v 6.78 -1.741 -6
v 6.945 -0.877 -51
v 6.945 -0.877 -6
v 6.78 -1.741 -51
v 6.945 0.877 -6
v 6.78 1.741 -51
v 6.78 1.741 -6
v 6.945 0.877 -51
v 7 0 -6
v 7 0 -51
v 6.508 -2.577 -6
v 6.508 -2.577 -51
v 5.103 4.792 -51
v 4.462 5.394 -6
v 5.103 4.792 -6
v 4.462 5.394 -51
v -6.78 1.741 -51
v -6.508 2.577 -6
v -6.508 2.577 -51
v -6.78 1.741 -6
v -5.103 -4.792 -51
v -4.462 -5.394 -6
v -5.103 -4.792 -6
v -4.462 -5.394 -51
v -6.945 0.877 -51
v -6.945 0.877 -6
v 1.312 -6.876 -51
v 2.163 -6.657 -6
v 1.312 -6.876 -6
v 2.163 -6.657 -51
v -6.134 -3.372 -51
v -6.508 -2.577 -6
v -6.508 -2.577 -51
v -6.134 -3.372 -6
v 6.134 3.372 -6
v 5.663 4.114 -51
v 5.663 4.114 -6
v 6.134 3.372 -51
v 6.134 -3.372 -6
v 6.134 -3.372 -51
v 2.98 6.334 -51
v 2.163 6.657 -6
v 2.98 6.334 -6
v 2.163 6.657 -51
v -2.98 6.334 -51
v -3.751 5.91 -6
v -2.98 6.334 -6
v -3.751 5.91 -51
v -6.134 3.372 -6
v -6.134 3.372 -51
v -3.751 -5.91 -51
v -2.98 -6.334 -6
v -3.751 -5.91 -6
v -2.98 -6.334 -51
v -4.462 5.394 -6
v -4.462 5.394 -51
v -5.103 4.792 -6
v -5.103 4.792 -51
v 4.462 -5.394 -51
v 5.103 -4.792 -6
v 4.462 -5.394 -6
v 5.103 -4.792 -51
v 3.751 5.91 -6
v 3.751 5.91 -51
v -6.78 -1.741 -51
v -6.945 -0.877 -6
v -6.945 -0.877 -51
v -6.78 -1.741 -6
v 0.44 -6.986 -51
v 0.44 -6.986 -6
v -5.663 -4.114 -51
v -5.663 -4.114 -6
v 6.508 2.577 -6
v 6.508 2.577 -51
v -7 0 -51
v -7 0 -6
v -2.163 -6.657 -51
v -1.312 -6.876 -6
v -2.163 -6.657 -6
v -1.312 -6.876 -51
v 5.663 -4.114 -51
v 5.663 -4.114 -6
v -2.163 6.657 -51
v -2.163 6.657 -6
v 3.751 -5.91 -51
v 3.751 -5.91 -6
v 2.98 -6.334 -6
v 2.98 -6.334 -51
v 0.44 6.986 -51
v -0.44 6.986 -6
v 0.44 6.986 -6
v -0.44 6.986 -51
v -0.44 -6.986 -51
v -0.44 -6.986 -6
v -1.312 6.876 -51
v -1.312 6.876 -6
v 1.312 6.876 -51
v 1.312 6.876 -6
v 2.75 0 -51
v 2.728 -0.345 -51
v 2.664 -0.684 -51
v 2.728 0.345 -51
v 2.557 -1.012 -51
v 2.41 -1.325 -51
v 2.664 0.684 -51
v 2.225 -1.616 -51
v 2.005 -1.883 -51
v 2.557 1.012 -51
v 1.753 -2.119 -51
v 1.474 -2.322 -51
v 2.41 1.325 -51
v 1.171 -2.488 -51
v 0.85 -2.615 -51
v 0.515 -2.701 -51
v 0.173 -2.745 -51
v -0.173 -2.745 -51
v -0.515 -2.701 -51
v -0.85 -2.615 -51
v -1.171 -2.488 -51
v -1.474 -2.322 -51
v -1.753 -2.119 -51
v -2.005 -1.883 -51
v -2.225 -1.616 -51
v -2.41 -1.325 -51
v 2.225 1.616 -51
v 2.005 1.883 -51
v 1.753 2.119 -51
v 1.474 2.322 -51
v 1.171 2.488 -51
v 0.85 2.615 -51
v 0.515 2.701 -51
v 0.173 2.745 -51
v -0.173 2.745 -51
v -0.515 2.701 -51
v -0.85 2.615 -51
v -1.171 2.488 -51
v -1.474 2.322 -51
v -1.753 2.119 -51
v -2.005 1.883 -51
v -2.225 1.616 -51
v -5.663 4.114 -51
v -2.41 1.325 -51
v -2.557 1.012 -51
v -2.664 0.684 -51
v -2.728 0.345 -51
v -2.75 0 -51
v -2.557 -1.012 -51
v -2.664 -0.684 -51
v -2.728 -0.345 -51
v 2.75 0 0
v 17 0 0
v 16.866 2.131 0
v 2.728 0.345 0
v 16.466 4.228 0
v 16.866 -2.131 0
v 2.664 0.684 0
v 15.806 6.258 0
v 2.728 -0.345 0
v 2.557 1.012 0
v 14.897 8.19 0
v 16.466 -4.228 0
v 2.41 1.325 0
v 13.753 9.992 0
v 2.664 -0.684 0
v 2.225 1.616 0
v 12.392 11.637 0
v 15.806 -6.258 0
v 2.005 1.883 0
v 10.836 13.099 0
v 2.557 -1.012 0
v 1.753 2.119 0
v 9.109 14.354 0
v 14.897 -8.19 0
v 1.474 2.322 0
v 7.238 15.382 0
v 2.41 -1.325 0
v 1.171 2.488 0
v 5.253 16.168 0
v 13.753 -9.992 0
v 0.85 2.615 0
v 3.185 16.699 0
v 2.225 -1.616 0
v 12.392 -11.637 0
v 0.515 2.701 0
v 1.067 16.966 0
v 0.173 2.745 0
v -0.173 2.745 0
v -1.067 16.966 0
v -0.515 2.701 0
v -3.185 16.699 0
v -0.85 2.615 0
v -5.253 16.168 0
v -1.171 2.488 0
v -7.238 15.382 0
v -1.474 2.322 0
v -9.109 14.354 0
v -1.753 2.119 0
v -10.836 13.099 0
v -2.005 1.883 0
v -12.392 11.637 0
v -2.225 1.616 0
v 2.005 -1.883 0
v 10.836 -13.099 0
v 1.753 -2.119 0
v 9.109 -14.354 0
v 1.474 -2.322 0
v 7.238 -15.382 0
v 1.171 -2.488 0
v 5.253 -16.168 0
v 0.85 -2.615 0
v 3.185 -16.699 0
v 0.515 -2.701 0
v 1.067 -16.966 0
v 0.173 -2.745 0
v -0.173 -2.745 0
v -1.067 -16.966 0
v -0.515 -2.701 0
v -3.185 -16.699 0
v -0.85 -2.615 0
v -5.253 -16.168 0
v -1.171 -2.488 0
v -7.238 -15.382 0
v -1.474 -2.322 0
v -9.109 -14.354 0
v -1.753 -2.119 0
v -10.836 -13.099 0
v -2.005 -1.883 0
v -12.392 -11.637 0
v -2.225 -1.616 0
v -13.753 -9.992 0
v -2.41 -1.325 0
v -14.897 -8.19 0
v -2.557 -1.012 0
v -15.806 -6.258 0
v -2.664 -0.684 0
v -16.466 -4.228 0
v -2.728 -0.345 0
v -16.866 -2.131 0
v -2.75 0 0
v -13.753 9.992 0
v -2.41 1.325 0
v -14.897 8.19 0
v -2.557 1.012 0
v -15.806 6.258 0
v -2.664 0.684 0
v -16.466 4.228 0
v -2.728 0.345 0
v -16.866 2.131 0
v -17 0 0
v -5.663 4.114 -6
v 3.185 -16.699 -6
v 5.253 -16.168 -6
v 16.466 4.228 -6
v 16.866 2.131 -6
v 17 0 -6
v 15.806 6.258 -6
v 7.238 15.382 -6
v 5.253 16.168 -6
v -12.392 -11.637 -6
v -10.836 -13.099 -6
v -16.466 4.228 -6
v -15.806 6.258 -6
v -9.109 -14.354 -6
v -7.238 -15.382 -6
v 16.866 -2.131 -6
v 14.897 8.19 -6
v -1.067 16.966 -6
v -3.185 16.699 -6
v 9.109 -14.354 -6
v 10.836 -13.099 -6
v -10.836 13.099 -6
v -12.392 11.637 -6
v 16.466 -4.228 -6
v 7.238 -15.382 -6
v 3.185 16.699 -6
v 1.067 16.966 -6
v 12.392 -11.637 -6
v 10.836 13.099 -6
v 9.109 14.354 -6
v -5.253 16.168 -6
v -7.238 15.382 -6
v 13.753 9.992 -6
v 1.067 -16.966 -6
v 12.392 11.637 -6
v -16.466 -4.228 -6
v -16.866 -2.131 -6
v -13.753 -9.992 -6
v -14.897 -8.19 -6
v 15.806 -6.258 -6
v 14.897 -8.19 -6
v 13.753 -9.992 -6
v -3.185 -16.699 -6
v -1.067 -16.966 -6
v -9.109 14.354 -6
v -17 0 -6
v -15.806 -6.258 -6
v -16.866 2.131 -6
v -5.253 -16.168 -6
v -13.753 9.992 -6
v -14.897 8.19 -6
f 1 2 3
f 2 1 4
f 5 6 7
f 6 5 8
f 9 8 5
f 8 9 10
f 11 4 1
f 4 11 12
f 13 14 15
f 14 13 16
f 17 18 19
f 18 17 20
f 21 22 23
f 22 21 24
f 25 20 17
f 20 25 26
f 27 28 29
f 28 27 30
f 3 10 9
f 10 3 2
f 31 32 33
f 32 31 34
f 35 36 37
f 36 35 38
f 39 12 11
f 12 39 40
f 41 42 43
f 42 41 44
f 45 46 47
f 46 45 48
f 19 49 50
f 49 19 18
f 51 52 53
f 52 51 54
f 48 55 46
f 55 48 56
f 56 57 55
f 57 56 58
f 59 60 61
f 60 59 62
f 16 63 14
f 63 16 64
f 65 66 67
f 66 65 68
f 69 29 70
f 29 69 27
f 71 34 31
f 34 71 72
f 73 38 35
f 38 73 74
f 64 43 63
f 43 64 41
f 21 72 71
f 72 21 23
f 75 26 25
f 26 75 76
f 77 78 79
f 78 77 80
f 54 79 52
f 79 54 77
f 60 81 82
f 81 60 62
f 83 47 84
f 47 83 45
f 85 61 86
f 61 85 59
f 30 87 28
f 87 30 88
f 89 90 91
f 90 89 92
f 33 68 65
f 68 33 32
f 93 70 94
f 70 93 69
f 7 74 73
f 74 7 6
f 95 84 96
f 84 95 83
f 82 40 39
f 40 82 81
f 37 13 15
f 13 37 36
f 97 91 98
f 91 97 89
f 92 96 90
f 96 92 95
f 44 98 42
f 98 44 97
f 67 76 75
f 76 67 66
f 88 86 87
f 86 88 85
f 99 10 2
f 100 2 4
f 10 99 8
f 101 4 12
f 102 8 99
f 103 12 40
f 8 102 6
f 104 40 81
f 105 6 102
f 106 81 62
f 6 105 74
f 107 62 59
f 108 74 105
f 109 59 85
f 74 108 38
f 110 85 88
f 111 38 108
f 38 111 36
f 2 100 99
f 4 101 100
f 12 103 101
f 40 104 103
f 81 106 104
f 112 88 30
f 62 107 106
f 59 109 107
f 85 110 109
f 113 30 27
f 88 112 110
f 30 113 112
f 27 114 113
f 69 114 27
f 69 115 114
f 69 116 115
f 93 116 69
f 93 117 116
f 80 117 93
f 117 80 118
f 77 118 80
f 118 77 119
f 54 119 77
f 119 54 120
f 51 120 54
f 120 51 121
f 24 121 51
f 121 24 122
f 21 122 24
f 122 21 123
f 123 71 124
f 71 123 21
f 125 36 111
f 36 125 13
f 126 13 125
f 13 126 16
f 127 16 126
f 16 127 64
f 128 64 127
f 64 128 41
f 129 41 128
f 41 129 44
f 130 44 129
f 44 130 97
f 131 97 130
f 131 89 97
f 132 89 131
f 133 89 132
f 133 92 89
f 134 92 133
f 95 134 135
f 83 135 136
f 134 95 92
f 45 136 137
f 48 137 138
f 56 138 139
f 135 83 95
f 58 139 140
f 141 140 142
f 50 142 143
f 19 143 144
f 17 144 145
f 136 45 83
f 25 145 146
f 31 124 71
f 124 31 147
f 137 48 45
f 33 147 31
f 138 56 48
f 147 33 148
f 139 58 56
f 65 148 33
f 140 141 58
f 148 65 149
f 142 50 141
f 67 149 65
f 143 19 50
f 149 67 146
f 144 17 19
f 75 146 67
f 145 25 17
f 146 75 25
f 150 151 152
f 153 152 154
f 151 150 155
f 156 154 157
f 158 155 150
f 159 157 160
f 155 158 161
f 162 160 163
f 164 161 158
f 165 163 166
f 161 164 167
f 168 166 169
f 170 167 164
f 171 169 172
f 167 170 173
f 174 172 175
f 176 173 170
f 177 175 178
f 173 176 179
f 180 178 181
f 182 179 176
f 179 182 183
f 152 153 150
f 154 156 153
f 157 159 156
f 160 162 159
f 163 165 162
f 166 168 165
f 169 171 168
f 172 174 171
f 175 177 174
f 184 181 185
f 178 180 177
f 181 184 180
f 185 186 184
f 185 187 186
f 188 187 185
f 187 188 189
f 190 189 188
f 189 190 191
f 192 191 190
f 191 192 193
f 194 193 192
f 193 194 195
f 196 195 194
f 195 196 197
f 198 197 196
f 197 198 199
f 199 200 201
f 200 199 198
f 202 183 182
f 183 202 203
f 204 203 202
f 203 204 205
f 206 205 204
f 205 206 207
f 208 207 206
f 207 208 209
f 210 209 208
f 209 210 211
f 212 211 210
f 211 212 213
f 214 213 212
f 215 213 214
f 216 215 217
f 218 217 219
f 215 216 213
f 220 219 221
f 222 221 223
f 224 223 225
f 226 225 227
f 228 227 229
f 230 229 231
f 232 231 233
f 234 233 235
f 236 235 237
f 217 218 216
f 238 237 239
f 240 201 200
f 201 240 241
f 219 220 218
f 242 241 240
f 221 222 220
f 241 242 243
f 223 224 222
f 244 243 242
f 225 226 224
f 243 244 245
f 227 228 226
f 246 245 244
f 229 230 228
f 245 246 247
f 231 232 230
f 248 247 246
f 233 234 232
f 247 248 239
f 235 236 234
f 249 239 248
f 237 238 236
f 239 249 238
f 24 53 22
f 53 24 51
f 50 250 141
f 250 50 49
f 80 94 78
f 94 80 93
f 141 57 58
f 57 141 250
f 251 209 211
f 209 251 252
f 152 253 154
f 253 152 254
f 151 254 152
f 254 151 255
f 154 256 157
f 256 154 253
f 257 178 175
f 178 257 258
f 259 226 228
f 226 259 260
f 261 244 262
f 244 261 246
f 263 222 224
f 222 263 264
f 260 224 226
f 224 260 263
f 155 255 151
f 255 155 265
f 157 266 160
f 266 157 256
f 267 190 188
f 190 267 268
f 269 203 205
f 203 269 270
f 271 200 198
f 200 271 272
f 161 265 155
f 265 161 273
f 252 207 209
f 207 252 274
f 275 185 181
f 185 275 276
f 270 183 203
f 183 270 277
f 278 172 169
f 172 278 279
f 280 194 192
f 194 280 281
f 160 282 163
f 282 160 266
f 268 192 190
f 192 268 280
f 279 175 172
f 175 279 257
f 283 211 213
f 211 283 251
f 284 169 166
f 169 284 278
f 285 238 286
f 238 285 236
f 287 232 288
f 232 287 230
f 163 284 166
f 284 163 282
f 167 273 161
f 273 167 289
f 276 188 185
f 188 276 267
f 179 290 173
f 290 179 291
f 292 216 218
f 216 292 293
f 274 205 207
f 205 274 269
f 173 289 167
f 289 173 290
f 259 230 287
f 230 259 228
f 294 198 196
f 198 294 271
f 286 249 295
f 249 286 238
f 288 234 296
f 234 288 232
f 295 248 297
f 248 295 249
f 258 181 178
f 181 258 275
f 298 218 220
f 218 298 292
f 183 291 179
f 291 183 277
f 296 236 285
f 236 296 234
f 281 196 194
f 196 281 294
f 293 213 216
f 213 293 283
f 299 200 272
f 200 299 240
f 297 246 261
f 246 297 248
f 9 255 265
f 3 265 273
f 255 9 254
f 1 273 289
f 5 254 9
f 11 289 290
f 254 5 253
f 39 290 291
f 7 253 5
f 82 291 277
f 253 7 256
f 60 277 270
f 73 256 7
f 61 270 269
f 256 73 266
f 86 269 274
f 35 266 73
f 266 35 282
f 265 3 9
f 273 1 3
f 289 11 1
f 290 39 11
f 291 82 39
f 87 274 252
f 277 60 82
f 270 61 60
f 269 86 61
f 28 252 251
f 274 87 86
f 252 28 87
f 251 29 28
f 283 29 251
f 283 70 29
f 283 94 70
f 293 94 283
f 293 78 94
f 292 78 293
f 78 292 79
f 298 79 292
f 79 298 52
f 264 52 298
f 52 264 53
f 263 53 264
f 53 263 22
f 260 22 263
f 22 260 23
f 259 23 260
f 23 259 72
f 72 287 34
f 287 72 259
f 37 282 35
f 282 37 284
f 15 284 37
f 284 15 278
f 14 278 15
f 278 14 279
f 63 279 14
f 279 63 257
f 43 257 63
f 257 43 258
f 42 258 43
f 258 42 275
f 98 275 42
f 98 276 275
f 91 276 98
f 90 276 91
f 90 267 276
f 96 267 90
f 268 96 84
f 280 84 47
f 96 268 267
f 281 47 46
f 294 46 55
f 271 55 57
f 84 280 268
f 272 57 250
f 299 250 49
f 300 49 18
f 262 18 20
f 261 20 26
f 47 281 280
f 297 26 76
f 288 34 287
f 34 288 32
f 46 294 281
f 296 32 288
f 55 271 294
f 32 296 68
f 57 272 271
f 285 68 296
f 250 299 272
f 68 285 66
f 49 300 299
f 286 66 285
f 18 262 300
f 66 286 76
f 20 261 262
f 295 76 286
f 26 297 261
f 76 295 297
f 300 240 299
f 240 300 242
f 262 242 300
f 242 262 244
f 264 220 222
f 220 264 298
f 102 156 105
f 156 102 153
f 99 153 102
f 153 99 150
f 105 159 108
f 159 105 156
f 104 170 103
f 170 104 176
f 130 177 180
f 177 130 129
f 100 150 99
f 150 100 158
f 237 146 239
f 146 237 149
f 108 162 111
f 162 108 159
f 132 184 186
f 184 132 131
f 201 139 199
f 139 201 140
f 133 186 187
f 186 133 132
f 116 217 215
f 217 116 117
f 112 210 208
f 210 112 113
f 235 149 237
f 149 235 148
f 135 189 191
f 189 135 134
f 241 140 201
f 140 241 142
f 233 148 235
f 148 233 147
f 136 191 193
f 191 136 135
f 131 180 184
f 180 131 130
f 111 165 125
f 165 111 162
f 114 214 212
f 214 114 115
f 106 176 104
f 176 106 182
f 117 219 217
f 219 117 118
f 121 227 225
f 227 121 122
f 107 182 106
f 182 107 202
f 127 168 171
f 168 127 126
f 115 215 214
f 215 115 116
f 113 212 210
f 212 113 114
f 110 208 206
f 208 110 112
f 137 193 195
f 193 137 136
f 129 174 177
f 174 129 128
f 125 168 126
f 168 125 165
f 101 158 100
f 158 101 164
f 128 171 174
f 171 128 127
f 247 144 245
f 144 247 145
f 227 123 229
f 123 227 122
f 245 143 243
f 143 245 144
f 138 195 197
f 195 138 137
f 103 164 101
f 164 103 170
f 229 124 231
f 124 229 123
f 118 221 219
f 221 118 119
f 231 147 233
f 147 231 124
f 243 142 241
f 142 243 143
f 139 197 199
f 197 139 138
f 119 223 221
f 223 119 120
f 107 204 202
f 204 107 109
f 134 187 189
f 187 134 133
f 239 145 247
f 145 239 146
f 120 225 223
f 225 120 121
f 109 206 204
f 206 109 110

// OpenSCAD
$fn = 50;


difference() {
	union() {
		translate(v = [0, 0, -51.0000000000]) {
			cylinder(h = 51, r = 7.0000000000);
		}
		translate(v = [0, 0, -6.0000000000]) {
			cylinder(h = 6, r = 17.0000000000);
		}
	}
	union() {
		#translate(v = [0, 0, -51]) {
			cylinder(h = 51, r = 2.7500000000);
		}
	}
}
